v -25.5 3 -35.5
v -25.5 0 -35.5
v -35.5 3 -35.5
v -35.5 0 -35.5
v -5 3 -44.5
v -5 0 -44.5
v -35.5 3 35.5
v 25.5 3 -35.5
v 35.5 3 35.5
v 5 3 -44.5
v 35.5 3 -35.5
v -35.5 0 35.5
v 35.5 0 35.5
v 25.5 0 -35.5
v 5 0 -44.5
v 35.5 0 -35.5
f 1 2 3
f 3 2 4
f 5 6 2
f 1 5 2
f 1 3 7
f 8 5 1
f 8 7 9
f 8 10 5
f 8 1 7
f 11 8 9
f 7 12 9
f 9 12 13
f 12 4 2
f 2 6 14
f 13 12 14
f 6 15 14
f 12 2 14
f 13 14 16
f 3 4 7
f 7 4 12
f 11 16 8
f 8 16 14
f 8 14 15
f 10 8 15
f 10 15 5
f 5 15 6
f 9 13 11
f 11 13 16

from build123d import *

# Parameters (mm, degrees)
BOSS_EXTRUDE1_DEPTH = 3


with BuildPart() as part:
    # Sketch1 → Boss-Extrude1 (new body)
    with BuildSketch(Plane(origin=(0, 0, 0), x_dir=(1, 0, 0), z_dir=(0, 1, 0))):
        Polygon((-5, 44.5), (-25.5, 35.5), (25.5, 35.5), (5, 44.5), align=None)
        Polygon((-25.5, 35.5), (-35.5, 35.5), (-35.5, -35.5), (35.5, -35.5), (35.5, 35.5), (25.5, 35.5), align=None)
    extrude(amount=BOSS_EXTRUDE1_DEPTH)


solid = part.part
